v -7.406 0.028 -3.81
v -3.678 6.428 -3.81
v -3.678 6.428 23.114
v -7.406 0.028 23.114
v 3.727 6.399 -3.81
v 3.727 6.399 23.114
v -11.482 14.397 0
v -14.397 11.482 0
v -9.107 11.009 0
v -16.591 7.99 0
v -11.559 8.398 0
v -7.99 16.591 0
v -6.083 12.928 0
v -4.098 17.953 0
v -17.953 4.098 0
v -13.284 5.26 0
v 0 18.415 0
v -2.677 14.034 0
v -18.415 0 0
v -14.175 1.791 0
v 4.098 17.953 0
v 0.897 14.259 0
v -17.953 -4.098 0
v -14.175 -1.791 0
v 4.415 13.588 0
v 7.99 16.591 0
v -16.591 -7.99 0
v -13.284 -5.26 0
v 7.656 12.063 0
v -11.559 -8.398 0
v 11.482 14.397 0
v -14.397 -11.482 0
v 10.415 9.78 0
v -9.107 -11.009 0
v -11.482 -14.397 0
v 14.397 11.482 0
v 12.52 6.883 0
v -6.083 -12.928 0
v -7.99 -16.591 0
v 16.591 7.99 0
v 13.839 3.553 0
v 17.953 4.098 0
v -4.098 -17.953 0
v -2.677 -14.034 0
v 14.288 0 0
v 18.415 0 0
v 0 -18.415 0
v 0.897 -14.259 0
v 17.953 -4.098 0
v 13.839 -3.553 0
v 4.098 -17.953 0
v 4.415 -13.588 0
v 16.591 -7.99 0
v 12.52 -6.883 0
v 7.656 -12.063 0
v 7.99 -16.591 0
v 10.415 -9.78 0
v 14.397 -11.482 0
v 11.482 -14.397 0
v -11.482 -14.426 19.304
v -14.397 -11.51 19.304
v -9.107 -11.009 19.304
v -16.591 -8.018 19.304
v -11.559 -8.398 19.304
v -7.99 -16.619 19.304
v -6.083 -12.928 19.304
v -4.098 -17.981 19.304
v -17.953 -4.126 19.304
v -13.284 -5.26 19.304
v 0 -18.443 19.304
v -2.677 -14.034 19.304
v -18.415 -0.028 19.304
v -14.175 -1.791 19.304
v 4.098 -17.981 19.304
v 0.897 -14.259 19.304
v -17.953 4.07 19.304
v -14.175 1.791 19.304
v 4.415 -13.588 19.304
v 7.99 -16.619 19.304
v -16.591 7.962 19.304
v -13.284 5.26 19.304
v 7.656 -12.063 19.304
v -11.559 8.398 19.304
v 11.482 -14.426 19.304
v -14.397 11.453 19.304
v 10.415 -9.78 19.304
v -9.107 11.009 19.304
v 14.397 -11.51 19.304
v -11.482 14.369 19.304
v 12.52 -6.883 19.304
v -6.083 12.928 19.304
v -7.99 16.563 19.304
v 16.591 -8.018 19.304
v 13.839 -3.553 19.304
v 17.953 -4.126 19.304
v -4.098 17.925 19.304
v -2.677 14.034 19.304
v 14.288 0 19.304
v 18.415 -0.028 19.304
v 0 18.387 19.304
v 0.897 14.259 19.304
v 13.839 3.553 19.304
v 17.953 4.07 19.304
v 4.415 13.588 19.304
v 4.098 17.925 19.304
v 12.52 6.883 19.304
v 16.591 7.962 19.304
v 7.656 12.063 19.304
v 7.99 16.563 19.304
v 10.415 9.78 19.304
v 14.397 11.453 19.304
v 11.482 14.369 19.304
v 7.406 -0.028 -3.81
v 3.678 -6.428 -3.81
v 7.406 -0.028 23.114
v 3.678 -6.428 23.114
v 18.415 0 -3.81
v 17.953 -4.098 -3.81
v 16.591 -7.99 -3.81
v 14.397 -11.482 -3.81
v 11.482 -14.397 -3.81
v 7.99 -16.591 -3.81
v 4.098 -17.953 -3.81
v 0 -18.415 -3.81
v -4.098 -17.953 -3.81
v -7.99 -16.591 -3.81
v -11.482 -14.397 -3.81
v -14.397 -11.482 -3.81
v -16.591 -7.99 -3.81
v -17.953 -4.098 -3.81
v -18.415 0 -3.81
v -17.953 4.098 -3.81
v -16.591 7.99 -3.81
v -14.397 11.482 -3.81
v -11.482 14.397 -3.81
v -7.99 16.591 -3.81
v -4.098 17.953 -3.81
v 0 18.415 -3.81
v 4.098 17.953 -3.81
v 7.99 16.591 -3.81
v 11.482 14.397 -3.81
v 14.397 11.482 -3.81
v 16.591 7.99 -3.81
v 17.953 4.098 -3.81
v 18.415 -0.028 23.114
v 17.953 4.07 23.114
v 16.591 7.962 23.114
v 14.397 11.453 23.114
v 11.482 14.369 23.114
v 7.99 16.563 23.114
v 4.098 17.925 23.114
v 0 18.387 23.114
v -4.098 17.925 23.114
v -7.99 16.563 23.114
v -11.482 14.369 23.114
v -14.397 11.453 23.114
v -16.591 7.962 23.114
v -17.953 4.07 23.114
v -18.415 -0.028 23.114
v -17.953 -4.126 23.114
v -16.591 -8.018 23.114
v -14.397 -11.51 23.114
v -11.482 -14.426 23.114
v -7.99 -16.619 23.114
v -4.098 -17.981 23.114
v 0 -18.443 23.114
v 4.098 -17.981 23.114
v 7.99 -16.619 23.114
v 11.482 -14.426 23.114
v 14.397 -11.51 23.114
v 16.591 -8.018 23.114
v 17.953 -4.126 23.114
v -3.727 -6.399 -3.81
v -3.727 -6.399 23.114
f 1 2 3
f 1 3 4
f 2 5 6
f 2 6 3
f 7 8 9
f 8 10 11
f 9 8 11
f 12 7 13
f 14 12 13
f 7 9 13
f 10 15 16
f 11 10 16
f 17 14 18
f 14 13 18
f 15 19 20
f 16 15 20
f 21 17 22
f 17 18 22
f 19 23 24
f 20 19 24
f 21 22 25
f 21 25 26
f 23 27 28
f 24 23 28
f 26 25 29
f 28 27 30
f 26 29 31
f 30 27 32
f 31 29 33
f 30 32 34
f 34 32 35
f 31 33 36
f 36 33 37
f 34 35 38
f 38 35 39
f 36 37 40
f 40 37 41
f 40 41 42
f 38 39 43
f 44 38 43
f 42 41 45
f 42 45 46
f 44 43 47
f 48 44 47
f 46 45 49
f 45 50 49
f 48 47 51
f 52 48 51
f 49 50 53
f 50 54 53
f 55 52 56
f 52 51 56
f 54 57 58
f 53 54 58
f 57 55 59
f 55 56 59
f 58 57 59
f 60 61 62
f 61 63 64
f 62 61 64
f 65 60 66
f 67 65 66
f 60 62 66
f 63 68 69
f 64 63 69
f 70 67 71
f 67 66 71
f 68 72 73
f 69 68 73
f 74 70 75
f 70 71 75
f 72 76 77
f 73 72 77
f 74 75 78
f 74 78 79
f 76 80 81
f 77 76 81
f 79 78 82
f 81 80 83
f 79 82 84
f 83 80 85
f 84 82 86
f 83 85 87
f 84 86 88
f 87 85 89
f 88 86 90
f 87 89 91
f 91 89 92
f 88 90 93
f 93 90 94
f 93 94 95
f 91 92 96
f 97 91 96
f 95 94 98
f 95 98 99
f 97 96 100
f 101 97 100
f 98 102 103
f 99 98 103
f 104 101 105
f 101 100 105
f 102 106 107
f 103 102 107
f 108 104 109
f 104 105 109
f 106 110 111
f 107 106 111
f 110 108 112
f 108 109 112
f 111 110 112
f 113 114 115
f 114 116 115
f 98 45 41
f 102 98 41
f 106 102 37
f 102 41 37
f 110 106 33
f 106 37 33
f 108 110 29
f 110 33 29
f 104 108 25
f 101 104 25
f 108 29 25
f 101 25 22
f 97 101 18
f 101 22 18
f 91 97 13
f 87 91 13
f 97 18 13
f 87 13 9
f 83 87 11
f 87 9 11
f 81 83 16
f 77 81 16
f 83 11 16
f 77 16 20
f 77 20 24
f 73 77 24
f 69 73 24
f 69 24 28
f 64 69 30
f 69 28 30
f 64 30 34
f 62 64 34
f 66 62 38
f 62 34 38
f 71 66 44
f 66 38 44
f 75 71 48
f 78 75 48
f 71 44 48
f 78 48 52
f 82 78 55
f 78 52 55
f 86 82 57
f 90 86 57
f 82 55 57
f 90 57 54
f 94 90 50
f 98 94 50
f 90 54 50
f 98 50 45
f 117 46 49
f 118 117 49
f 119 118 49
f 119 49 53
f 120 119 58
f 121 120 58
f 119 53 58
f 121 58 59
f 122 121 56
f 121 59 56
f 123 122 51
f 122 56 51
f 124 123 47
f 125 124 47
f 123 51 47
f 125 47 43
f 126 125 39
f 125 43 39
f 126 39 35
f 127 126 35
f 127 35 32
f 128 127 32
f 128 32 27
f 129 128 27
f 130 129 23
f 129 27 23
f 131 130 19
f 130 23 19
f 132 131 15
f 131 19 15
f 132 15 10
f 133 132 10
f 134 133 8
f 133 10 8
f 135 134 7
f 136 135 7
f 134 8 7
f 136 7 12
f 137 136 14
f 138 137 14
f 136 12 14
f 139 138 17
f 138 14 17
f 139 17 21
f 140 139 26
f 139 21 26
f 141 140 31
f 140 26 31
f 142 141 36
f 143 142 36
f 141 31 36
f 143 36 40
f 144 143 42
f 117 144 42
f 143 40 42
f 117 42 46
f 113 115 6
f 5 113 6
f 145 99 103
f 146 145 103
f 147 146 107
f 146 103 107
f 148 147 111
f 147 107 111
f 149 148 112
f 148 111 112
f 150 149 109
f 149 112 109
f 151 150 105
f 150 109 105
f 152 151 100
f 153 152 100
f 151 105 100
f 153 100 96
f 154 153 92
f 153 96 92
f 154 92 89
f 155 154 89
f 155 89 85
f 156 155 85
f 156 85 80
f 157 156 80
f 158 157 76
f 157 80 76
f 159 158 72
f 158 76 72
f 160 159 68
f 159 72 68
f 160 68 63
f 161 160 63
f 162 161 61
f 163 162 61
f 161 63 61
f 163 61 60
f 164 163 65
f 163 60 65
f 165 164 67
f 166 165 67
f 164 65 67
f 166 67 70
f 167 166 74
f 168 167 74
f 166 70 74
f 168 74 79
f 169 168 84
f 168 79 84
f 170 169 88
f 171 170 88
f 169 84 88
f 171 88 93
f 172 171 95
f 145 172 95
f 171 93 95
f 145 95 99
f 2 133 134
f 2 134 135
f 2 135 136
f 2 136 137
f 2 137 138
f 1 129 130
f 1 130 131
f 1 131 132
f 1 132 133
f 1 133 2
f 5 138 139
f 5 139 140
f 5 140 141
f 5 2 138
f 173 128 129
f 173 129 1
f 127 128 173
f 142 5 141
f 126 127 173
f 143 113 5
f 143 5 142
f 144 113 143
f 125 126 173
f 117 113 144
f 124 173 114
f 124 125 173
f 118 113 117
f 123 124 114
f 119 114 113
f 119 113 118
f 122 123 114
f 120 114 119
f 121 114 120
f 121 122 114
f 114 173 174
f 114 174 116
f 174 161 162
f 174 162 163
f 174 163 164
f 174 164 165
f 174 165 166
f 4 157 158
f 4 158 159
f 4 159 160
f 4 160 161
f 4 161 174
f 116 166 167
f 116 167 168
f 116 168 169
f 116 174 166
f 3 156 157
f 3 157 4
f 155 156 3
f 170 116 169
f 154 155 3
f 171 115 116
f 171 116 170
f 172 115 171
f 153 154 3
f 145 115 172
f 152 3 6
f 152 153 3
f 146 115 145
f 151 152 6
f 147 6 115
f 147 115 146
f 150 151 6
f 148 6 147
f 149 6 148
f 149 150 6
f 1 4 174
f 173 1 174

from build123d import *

# Parameters (mm, degrees)
F0_R     = 14.2875
F1_DEPTH = 19.304
F2_R     = 18.415
F3_DEPTH = 3.81
F4_R     = 18.415
F5_DEPTH = 3.81


with BuildPart() as f1:
    # F0 (on Top) → F1 (new body)
    with BuildSketch(Plane.XY):
        Circle(F0_R)
        Polygon((-3.678436, 6.427525), (3.727182, 6.399382), (7.405618, -0.028143), (3.678436, -6.427525), (-3.727182, -6.399382), (-7.405618, 0.028143), align=None, mode=Mode.SUBTRACT)
    extrude(amount=F1_DEPTH)

    # F2 (on face) → F3 (join)
    with BuildSketch(Plane.XY.offset(19.304)):
        with Locations((0, -0.028143)):
            Circle(F2_R)
        Polygon((-3.678436, 6.427525), (3.727182, 6.399382), (7.405618, -0.028143), (3.678436, -6.427525), (-3.727182, -6.399382), (-7.405618, 0.028143), align=None, mode=Mode.SUBTRACT)
    extrude(amount=F3_DEPTH)

    # F4 (on face) → F5 (join)
    with BuildSketch(Plane(origin=(0, 0, 0), x_dir=(1, 0, 0), z_dir=(0, 0, -1))):
        Circle(F4_R)
        Polygon((3.678436, 6.427525), (7.405618, 0.028143), (3.727182, -6.399382), (-3.678436, -6.427525), (-7.405618, -0.028143), (-3.727182, 6.399382), align=None, mode=Mode.SUBTRACT)
    extrude(amount=F5_DEPTH)


solid = f1.part
